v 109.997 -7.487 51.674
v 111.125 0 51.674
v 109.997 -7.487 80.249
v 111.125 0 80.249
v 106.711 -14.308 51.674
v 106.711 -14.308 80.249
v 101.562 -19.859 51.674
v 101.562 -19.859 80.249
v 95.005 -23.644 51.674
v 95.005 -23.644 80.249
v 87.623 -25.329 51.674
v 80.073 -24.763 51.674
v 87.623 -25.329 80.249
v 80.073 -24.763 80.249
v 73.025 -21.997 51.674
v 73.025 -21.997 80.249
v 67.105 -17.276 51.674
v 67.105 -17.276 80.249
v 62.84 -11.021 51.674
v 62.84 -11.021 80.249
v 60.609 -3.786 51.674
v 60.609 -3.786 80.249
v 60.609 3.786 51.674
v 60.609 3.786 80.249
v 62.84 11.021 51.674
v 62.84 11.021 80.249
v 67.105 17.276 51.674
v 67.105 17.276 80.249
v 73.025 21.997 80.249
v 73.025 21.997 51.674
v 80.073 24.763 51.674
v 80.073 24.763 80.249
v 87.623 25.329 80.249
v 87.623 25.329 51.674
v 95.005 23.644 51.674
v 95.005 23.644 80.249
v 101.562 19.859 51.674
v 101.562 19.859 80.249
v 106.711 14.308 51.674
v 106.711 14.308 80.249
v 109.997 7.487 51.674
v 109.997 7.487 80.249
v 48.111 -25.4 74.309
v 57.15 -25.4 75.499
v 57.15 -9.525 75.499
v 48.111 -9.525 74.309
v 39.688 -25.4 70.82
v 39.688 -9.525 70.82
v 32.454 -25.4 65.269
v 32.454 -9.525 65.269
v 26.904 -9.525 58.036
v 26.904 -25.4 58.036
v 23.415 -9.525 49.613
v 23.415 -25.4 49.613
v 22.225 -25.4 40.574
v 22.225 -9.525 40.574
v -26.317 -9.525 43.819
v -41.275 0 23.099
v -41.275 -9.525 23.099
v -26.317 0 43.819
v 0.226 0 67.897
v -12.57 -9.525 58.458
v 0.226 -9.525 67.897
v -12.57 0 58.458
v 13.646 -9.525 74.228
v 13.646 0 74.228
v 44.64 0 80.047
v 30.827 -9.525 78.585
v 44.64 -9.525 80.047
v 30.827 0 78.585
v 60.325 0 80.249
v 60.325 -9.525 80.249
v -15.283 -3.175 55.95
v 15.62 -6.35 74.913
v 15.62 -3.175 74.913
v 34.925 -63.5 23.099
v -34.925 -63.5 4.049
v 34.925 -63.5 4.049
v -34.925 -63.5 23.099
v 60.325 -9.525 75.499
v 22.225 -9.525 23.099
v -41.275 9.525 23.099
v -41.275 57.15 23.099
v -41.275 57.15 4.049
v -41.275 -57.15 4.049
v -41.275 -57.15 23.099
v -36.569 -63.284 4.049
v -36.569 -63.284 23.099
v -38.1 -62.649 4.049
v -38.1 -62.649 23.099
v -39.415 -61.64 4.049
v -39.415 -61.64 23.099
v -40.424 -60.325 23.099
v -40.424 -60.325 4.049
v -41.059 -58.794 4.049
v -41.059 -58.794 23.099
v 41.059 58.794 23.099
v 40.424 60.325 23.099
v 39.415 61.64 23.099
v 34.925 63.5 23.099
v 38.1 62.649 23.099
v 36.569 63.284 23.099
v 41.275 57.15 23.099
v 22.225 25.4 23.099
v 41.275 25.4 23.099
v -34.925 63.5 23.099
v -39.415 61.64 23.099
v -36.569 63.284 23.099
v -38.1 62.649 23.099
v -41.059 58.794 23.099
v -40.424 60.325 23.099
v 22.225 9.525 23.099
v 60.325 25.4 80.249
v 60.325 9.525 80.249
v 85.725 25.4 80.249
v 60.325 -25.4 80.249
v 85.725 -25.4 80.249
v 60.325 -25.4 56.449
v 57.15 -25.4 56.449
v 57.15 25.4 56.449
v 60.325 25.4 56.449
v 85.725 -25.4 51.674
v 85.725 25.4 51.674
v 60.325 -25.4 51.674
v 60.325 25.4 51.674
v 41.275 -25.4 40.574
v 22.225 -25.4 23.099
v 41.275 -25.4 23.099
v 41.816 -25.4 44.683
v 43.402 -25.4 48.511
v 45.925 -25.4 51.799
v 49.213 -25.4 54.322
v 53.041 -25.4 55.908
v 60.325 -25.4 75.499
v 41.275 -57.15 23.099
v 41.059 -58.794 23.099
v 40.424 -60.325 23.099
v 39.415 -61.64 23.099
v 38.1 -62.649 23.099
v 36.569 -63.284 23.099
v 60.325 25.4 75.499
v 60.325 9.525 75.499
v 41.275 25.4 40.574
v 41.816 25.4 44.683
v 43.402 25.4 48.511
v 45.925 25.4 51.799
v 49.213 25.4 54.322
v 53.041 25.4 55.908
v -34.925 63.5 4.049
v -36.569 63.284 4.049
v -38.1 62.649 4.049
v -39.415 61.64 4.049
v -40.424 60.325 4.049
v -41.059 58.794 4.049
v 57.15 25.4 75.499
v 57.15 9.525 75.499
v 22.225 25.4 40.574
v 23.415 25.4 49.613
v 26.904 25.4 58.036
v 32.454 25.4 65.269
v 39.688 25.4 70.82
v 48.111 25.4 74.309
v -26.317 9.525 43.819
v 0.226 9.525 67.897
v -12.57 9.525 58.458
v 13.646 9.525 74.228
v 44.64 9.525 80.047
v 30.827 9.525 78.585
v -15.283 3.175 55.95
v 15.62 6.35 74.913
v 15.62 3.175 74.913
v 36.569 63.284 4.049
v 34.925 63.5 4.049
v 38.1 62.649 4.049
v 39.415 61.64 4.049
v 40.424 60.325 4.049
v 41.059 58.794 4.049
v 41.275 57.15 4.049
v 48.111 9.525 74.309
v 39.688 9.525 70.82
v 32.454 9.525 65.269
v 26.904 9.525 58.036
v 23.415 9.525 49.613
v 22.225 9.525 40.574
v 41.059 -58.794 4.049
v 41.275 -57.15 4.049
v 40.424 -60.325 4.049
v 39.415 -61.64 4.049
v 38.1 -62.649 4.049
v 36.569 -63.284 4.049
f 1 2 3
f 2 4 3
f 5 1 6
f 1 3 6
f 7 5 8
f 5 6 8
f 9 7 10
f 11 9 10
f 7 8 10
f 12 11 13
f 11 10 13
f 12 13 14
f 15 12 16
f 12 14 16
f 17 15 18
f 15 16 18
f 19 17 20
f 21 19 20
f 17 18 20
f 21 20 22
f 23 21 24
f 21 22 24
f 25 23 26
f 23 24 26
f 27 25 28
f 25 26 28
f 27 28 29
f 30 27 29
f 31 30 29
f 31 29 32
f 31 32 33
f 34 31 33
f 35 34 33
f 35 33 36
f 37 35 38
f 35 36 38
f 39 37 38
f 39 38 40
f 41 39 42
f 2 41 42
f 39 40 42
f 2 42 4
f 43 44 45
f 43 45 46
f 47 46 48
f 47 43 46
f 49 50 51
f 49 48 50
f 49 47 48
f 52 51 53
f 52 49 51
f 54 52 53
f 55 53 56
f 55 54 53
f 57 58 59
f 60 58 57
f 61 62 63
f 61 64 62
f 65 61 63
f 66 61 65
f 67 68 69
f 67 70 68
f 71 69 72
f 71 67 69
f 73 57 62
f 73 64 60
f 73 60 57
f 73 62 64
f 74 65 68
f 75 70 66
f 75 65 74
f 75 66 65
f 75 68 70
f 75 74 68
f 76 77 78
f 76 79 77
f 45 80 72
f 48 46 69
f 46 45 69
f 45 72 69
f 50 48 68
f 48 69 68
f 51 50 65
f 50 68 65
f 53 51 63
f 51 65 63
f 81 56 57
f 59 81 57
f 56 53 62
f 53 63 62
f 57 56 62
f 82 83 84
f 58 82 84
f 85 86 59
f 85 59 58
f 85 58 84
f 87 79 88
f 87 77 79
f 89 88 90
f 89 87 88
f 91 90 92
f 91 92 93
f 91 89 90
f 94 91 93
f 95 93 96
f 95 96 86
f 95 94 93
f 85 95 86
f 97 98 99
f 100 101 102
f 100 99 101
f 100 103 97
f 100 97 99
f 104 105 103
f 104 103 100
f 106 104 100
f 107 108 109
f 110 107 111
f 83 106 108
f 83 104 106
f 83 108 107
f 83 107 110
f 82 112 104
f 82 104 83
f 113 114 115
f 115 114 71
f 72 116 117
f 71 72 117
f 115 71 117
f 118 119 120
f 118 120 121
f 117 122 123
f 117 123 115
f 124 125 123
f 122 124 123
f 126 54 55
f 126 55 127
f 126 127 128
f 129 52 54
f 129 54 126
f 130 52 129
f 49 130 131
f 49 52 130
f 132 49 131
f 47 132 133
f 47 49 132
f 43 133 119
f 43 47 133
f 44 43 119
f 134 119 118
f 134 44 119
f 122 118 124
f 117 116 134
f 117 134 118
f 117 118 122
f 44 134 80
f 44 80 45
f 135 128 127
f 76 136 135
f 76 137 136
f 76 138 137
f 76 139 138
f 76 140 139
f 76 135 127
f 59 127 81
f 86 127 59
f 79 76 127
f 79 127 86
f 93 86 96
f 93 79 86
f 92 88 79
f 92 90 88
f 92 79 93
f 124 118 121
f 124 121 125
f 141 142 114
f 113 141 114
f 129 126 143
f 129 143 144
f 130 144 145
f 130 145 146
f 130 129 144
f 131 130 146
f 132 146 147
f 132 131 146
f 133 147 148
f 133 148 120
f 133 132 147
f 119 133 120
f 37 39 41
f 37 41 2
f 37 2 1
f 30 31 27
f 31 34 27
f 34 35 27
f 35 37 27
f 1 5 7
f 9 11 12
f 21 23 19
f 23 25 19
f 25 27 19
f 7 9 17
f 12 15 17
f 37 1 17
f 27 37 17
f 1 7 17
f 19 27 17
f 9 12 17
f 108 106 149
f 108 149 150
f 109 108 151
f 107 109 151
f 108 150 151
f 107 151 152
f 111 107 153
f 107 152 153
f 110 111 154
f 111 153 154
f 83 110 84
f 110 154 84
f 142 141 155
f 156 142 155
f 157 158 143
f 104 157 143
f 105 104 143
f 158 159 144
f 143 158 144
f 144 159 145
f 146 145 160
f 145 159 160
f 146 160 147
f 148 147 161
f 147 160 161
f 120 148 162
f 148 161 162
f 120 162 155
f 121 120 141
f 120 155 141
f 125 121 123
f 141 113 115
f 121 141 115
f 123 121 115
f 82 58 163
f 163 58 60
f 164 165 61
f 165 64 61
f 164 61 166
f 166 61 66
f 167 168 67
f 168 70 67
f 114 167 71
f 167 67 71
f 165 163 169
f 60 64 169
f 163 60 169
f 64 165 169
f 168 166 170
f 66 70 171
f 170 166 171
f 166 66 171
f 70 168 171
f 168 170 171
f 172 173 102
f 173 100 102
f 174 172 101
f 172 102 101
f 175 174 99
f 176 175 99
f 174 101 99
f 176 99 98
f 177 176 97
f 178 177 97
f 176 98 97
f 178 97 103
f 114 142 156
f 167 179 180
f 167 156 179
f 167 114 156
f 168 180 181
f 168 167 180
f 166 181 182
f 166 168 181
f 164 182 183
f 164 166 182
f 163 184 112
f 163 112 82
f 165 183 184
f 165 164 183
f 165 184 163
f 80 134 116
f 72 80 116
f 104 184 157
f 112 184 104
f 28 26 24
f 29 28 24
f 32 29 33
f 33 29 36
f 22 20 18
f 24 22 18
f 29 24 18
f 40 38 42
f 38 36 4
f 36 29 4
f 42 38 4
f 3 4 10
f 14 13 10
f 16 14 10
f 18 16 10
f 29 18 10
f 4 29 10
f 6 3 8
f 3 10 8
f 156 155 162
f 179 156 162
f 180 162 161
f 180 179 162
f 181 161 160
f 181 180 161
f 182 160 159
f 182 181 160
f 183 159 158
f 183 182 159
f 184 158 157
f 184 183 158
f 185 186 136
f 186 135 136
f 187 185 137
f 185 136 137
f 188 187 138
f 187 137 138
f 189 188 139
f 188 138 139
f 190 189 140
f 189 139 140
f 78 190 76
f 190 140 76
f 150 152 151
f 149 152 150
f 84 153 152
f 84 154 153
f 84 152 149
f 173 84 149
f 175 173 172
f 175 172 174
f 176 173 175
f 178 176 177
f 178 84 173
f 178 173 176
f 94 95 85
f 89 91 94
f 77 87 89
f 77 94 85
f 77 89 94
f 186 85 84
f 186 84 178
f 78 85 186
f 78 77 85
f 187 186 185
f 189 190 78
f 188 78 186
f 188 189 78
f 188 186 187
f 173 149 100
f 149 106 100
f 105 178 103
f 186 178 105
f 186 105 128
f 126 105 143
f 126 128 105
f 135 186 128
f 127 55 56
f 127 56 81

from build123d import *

# Parameters (mm, degrees)
F1_DEPTH = 63.5
F0_W     = 25.4
F0_H     = 4.7498
F2_DEPTH = 25.4
F3_DEPTH = 9.525
F5_R     = 6.35


with BuildPart() as f1:
    # F0 (on Front) → F1 (new body, symmetric)
    with BuildSketch(Plane.XZ):
        Polygon((-41.275, 4.048595), (41.275, 4.048595), (41.275, 23.098595), (22.225, 23.098595), (-41.275, 23.098595), align=None)
    extrude(amount=F1_DEPTH, both=True)

    # F0 (on Front) → F2 (join, symmetric)
    with BuildSketch(Plane.XZ):
        Polygon((85.725, 75.498795), (60.325, 75.498795), (60.325, 56.448795), (60.325, 51.673595), (85.725, 51.673595), align=None)
        with BuildLine():
            Line((22.225, 23.098595), (41.275, 23.098595))
            Line((41.275, 23.098595), (41.275, 40.573795))
            ThreePointArc((41.275, 40.573795), (45.92468, 51.799115), (57.15, 56.448795))
            Line((57.15, 56.448795), (60.325, 56.448795))
            Line((60.325, 56.448795), (60.325, 75.498795))
            Line((60.325, 75.498795), (57.15, 75.498795))
            ThreePointArc((57.15, 75.498795), (32.454296, 65.269499), (22.225, 40.573795))
            Line((22.225, 40.573795), (22.225, 23.098595))
        make_face()
        with Locations((73.025, 77.873695)):
            Rectangle(F0_W, F0_H)
    extrude(amount=F2_DEPTH, both=True)

    # F0 (on Front) → F3 (join, symmetric)
    with BuildSketch(Plane.XZ):
        with BuildLine():
            add(Edge.make_bspline(
                [(-41.275, 23.098595), (-14.773102, 62.980063), (5.753732, 81.640825), (60.325, 80.248595)],
                knots=[0, 0, 0, 0, 116.570504, 116.570504, 116.570504, 116.570504], degree=3))
            Line((-41.275, 23.098595), (22.225, 23.098595))
            Line((22.225, 23.098595), (22.225, 40.573795))
            ThreePointArc((22.225, 40.573795), (32.454296, 65.269499), (57.15, 75.498795))
            Line((57.15, 75.498795), (60.325, 75.498795))
            Line((60.325, 75.498795), (60.325, 80.248595))
        make_face()
    extrude(amount=F3_DEPTH, both=True)

    # F5
    f5_edges = [f1.edges().sort_by_distance(p)[0] for p in [
        (41.275, 63.5, 13.573595),
        (-41.275, 63.5, 13.573595),
        (41.275, -63.5, 13.573595),
        (-41.275, -63.5, 13.573595),
    ]]
    fillet(f5_edges, radius=F5_R)


with BuildPart() as f4:
    # F0 (on Front) → F4 (revolve)
    with BuildSketch(Plane.XZ):
        Polygon((111.125, 80.248595), (85.725, 80.248595), (85.725, 75.498795), (85.725, 51.673595), (111.125, 51.673595), align=None)
    revolve(axis=Axis((85.725, 0, 65.961095), (0, 0, -1)))


solid = Compound([f1.part, f4.part])
